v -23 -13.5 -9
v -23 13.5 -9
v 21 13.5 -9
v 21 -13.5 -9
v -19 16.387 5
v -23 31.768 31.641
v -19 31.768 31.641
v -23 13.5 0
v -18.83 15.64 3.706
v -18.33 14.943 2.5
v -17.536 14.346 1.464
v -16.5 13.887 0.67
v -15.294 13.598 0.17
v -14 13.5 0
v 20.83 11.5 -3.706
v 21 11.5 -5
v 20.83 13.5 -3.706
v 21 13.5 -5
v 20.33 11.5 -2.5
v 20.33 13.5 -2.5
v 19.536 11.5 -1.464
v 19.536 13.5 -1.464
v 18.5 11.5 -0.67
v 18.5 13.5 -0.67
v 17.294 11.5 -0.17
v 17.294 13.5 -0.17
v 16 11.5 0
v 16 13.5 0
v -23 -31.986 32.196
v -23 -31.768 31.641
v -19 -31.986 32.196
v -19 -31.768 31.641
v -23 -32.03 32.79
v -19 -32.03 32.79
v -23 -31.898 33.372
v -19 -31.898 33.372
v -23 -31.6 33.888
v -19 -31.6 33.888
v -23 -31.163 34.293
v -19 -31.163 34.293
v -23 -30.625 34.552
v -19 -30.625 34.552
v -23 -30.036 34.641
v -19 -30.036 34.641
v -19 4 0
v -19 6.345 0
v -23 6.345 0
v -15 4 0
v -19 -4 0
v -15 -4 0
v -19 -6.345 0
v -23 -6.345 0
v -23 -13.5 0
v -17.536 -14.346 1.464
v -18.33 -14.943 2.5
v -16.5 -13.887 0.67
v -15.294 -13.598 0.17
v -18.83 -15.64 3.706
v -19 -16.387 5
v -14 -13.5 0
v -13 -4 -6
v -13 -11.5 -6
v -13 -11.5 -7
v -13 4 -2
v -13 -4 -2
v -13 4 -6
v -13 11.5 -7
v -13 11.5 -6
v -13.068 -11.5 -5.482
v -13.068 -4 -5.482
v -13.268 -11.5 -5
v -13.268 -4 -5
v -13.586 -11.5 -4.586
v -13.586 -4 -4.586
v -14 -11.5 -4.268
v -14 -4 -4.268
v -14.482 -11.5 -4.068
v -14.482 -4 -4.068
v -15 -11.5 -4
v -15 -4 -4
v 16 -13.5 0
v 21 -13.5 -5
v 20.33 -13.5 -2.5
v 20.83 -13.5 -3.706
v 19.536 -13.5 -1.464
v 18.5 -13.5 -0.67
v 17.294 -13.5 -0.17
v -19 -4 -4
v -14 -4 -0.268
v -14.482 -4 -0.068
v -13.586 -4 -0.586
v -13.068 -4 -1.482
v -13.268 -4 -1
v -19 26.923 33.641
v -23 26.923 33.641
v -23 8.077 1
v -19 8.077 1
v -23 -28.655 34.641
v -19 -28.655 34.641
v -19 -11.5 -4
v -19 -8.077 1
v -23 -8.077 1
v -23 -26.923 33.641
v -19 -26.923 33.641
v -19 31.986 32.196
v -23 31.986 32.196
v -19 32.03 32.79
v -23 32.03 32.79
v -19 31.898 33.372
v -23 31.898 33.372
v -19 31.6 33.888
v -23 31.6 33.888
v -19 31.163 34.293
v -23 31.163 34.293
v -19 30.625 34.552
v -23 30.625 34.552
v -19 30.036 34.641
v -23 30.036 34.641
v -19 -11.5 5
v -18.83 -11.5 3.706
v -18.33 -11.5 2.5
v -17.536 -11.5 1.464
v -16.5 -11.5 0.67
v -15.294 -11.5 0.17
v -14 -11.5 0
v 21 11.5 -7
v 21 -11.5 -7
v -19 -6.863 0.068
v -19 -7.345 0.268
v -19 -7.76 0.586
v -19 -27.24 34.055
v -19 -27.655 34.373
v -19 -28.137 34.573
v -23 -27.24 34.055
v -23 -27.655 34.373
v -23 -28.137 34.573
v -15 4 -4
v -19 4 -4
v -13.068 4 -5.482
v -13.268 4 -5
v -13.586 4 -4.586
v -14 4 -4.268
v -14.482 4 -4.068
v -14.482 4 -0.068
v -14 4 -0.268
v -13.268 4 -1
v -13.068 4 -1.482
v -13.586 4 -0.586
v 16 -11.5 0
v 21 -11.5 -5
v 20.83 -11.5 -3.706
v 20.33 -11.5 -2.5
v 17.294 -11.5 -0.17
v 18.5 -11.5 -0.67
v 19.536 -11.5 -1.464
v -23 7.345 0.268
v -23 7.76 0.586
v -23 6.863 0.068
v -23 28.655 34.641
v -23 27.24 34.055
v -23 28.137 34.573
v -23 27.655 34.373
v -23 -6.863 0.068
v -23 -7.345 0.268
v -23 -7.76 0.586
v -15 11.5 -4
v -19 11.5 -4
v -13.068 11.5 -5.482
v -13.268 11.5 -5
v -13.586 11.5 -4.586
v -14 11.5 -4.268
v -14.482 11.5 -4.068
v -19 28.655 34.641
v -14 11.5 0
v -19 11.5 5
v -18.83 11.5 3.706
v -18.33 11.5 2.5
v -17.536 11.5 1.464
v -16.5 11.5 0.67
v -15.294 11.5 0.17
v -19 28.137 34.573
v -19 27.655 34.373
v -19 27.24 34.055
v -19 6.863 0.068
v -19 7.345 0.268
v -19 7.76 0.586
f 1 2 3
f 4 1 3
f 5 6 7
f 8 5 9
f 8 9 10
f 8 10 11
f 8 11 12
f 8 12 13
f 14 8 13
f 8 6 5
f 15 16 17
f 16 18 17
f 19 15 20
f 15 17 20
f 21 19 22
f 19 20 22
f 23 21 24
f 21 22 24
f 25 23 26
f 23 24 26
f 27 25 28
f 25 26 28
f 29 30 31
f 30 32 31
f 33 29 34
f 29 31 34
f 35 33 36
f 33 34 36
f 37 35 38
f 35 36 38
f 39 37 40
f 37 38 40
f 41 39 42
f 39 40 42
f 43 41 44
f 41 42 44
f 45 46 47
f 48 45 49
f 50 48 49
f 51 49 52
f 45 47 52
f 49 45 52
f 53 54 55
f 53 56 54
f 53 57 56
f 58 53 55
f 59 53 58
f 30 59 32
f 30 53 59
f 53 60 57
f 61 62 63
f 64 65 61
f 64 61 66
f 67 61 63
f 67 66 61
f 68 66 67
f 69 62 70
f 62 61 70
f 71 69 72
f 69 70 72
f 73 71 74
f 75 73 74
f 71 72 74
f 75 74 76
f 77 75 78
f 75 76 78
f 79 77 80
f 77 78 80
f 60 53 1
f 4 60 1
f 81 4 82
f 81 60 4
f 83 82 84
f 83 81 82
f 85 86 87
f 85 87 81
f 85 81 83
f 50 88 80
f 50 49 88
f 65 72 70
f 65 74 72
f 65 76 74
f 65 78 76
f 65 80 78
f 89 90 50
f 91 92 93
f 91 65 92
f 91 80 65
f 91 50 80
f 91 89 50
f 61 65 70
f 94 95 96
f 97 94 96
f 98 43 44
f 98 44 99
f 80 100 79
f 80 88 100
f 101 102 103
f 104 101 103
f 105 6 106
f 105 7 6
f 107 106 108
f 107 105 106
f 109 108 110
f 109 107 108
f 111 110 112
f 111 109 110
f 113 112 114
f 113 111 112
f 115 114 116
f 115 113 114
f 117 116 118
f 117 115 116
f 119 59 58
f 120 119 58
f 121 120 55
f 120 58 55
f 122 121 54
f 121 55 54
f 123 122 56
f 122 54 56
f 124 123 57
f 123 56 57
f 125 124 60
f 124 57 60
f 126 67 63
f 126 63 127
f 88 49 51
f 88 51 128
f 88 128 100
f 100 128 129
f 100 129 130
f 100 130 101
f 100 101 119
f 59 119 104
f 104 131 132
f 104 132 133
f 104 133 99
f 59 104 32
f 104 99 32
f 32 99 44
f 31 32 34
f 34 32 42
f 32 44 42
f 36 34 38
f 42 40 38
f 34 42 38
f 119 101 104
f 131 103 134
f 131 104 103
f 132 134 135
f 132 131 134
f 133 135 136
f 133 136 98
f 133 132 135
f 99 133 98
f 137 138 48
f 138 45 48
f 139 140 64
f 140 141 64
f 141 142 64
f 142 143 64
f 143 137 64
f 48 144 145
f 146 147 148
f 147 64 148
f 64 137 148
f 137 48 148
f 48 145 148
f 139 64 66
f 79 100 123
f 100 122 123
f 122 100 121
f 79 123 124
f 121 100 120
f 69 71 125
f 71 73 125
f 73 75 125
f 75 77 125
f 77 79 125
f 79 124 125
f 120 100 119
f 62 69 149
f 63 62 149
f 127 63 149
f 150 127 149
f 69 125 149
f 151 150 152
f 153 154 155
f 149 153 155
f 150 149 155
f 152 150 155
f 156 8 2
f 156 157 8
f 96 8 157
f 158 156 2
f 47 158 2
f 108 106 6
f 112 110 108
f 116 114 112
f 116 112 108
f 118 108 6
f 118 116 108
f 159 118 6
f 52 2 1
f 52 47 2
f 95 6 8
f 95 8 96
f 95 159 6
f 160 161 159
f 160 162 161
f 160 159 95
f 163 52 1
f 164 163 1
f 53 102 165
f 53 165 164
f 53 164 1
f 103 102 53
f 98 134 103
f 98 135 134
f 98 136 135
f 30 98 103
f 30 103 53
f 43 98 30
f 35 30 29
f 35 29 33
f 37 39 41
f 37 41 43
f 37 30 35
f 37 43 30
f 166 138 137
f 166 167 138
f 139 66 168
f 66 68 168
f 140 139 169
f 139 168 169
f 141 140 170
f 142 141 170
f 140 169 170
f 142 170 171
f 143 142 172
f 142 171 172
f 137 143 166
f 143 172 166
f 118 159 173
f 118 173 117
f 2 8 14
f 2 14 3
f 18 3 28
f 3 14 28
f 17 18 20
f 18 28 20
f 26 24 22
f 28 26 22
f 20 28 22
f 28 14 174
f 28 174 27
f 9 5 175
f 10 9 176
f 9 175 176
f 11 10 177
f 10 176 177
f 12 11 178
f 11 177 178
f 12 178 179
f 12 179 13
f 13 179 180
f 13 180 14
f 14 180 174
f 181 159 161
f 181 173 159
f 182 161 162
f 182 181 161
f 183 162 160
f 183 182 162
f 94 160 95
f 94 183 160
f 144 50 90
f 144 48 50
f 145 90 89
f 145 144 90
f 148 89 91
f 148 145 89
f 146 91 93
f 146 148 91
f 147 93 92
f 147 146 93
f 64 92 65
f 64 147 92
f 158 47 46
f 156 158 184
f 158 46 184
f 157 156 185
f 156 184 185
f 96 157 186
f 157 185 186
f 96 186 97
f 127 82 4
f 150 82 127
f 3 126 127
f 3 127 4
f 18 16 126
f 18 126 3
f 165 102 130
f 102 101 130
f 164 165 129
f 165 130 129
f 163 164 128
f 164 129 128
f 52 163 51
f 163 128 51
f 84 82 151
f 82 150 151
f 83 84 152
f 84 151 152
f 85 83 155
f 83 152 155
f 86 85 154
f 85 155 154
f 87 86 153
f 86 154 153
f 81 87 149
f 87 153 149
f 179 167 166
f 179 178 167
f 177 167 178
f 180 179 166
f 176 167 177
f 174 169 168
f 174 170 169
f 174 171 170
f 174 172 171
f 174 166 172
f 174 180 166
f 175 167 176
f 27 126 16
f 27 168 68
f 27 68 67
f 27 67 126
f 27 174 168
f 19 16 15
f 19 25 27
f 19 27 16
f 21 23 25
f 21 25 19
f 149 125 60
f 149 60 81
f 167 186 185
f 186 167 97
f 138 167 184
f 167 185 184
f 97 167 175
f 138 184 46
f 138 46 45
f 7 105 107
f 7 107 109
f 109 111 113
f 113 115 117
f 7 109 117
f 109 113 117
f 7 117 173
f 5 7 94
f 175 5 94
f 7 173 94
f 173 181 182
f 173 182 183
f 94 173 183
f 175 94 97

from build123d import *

# Parameters (mm, degrees)
F0_W      = 44
F0_H      = 27
F1_DEPTH  = 9
F2_W      = 34
F2_H      = 23
F3_DEPTH  = 7
F6_W      = 6
F6_H      = 7.5
F7_DEPTH  = 4
F5_W      = 6
F5_H      = 7.5
F10_DEPTH = 4
F12_DEPTH = 5
F14_R     = 2
F15_R     = 5


with BuildPart() as f1:
    # F0 (on Top) → F1 (new body)
    with BuildSketch(Plane.XY):
        with Locations((-1, 0)):
            Rectangle(F0_W, F0_H)
    extrude(amount=-F1_DEPTH)


with BuildPart() as f3:
    # F2 (on Top) → F3 (new body)
    with BuildSketch(Plane.XY):
        with Locations((4, 0)):
            Rectangle(F2_W, F2_H)
    extrude(amount=-F3_DEPTH)


with BuildPart() as f1_1:
    add(f1.part)

    # F4: cut F3
    add(f3.part, mode=Mode.SUBTRACT)


with BuildPart() as f7:
    # F6 (on Top) → F7 (new body)
    with BuildSketch(Plane.XY):
        with Locations((-16, -7.75)):
            Rectangle(F6_W, F6_H)
    extrude(amount=-F7_DEPTH)


with BuildPart() as f7b:
    # F5 (on Top) → F7, piece 2 (new body)
    with BuildSketch(Plane.XY):
        with Locations((-16, 7.75)):
            Rectangle(F5_W, F5_H)
    extrude(amount=-F7_DEPTH)


with BuildPart() as f1_2:
    add(f1_1.part)

    # F8: cut F7b, F7
    add(f7b.part, mode=Mode.SUBTRACT)
    add(f7.part, mode=Mode.SUBTRACT)

    # F9 (on face) → F10 (join)
    with BuildSketch(Plane(origin=(-23, 0, 0), x_dir=(0, -1, 0), z_dir=(-1, 0, 0))):
        Polygon((-13.5, 0), (13.5, 0), (33.5, 34.6410161514), (-33.5, 34.6410161514), align=None)
    extrude(amount=-F10_DEPTH)


with BuildPart() as f12:
    # F11 (on face) → F12 (new body)
    with BuildSketch(Plane(origin=(-23, 0, 0), x_dir=(0, -1, 0), z_dir=(-1, 0, 0))):
        Polygon((-7.5, 0), (7.5, 0), (27.5, 34.6410161514), (-27.5, 34.6410161514), align=None)
    extrude(amount=-F12_DEPTH)


with BuildPart() as f1_3:
    add(f1_2.part)

    # F13: cut F12
    add(f12.part, mode=Mode.SUBTRACT)

    # F14
    f14_edges = [f1_3.edges().sort_by_distance(p)[0] for p in [
        (-21, 33.5, 34.641016),
        (-21, 27.5, 34.641016),
        (-21, -27.5, 34.641016),
        (-21, -33.5, 34.641016),
        (-21, -7.5, 0),
        (-21, 7.5, 0),
        (-13, 0, 0),
        (-13, 7.75, -4),
        (-13, -7.75, -4),
    ]]
    fillet(f14_edges, radius=F14_R)

    # F15
    f15_edges = [f1_3.edges().sort_by_distance(p)[0] for p in [
        (-19, -12.5, 0),
        (-19, 12.5, 0),
        (21, 12.5, 0),
        (21, -12.5, 0),
    ]]
    fillet(f15_edges, radius=F15_R)


solid = f1_3.part
